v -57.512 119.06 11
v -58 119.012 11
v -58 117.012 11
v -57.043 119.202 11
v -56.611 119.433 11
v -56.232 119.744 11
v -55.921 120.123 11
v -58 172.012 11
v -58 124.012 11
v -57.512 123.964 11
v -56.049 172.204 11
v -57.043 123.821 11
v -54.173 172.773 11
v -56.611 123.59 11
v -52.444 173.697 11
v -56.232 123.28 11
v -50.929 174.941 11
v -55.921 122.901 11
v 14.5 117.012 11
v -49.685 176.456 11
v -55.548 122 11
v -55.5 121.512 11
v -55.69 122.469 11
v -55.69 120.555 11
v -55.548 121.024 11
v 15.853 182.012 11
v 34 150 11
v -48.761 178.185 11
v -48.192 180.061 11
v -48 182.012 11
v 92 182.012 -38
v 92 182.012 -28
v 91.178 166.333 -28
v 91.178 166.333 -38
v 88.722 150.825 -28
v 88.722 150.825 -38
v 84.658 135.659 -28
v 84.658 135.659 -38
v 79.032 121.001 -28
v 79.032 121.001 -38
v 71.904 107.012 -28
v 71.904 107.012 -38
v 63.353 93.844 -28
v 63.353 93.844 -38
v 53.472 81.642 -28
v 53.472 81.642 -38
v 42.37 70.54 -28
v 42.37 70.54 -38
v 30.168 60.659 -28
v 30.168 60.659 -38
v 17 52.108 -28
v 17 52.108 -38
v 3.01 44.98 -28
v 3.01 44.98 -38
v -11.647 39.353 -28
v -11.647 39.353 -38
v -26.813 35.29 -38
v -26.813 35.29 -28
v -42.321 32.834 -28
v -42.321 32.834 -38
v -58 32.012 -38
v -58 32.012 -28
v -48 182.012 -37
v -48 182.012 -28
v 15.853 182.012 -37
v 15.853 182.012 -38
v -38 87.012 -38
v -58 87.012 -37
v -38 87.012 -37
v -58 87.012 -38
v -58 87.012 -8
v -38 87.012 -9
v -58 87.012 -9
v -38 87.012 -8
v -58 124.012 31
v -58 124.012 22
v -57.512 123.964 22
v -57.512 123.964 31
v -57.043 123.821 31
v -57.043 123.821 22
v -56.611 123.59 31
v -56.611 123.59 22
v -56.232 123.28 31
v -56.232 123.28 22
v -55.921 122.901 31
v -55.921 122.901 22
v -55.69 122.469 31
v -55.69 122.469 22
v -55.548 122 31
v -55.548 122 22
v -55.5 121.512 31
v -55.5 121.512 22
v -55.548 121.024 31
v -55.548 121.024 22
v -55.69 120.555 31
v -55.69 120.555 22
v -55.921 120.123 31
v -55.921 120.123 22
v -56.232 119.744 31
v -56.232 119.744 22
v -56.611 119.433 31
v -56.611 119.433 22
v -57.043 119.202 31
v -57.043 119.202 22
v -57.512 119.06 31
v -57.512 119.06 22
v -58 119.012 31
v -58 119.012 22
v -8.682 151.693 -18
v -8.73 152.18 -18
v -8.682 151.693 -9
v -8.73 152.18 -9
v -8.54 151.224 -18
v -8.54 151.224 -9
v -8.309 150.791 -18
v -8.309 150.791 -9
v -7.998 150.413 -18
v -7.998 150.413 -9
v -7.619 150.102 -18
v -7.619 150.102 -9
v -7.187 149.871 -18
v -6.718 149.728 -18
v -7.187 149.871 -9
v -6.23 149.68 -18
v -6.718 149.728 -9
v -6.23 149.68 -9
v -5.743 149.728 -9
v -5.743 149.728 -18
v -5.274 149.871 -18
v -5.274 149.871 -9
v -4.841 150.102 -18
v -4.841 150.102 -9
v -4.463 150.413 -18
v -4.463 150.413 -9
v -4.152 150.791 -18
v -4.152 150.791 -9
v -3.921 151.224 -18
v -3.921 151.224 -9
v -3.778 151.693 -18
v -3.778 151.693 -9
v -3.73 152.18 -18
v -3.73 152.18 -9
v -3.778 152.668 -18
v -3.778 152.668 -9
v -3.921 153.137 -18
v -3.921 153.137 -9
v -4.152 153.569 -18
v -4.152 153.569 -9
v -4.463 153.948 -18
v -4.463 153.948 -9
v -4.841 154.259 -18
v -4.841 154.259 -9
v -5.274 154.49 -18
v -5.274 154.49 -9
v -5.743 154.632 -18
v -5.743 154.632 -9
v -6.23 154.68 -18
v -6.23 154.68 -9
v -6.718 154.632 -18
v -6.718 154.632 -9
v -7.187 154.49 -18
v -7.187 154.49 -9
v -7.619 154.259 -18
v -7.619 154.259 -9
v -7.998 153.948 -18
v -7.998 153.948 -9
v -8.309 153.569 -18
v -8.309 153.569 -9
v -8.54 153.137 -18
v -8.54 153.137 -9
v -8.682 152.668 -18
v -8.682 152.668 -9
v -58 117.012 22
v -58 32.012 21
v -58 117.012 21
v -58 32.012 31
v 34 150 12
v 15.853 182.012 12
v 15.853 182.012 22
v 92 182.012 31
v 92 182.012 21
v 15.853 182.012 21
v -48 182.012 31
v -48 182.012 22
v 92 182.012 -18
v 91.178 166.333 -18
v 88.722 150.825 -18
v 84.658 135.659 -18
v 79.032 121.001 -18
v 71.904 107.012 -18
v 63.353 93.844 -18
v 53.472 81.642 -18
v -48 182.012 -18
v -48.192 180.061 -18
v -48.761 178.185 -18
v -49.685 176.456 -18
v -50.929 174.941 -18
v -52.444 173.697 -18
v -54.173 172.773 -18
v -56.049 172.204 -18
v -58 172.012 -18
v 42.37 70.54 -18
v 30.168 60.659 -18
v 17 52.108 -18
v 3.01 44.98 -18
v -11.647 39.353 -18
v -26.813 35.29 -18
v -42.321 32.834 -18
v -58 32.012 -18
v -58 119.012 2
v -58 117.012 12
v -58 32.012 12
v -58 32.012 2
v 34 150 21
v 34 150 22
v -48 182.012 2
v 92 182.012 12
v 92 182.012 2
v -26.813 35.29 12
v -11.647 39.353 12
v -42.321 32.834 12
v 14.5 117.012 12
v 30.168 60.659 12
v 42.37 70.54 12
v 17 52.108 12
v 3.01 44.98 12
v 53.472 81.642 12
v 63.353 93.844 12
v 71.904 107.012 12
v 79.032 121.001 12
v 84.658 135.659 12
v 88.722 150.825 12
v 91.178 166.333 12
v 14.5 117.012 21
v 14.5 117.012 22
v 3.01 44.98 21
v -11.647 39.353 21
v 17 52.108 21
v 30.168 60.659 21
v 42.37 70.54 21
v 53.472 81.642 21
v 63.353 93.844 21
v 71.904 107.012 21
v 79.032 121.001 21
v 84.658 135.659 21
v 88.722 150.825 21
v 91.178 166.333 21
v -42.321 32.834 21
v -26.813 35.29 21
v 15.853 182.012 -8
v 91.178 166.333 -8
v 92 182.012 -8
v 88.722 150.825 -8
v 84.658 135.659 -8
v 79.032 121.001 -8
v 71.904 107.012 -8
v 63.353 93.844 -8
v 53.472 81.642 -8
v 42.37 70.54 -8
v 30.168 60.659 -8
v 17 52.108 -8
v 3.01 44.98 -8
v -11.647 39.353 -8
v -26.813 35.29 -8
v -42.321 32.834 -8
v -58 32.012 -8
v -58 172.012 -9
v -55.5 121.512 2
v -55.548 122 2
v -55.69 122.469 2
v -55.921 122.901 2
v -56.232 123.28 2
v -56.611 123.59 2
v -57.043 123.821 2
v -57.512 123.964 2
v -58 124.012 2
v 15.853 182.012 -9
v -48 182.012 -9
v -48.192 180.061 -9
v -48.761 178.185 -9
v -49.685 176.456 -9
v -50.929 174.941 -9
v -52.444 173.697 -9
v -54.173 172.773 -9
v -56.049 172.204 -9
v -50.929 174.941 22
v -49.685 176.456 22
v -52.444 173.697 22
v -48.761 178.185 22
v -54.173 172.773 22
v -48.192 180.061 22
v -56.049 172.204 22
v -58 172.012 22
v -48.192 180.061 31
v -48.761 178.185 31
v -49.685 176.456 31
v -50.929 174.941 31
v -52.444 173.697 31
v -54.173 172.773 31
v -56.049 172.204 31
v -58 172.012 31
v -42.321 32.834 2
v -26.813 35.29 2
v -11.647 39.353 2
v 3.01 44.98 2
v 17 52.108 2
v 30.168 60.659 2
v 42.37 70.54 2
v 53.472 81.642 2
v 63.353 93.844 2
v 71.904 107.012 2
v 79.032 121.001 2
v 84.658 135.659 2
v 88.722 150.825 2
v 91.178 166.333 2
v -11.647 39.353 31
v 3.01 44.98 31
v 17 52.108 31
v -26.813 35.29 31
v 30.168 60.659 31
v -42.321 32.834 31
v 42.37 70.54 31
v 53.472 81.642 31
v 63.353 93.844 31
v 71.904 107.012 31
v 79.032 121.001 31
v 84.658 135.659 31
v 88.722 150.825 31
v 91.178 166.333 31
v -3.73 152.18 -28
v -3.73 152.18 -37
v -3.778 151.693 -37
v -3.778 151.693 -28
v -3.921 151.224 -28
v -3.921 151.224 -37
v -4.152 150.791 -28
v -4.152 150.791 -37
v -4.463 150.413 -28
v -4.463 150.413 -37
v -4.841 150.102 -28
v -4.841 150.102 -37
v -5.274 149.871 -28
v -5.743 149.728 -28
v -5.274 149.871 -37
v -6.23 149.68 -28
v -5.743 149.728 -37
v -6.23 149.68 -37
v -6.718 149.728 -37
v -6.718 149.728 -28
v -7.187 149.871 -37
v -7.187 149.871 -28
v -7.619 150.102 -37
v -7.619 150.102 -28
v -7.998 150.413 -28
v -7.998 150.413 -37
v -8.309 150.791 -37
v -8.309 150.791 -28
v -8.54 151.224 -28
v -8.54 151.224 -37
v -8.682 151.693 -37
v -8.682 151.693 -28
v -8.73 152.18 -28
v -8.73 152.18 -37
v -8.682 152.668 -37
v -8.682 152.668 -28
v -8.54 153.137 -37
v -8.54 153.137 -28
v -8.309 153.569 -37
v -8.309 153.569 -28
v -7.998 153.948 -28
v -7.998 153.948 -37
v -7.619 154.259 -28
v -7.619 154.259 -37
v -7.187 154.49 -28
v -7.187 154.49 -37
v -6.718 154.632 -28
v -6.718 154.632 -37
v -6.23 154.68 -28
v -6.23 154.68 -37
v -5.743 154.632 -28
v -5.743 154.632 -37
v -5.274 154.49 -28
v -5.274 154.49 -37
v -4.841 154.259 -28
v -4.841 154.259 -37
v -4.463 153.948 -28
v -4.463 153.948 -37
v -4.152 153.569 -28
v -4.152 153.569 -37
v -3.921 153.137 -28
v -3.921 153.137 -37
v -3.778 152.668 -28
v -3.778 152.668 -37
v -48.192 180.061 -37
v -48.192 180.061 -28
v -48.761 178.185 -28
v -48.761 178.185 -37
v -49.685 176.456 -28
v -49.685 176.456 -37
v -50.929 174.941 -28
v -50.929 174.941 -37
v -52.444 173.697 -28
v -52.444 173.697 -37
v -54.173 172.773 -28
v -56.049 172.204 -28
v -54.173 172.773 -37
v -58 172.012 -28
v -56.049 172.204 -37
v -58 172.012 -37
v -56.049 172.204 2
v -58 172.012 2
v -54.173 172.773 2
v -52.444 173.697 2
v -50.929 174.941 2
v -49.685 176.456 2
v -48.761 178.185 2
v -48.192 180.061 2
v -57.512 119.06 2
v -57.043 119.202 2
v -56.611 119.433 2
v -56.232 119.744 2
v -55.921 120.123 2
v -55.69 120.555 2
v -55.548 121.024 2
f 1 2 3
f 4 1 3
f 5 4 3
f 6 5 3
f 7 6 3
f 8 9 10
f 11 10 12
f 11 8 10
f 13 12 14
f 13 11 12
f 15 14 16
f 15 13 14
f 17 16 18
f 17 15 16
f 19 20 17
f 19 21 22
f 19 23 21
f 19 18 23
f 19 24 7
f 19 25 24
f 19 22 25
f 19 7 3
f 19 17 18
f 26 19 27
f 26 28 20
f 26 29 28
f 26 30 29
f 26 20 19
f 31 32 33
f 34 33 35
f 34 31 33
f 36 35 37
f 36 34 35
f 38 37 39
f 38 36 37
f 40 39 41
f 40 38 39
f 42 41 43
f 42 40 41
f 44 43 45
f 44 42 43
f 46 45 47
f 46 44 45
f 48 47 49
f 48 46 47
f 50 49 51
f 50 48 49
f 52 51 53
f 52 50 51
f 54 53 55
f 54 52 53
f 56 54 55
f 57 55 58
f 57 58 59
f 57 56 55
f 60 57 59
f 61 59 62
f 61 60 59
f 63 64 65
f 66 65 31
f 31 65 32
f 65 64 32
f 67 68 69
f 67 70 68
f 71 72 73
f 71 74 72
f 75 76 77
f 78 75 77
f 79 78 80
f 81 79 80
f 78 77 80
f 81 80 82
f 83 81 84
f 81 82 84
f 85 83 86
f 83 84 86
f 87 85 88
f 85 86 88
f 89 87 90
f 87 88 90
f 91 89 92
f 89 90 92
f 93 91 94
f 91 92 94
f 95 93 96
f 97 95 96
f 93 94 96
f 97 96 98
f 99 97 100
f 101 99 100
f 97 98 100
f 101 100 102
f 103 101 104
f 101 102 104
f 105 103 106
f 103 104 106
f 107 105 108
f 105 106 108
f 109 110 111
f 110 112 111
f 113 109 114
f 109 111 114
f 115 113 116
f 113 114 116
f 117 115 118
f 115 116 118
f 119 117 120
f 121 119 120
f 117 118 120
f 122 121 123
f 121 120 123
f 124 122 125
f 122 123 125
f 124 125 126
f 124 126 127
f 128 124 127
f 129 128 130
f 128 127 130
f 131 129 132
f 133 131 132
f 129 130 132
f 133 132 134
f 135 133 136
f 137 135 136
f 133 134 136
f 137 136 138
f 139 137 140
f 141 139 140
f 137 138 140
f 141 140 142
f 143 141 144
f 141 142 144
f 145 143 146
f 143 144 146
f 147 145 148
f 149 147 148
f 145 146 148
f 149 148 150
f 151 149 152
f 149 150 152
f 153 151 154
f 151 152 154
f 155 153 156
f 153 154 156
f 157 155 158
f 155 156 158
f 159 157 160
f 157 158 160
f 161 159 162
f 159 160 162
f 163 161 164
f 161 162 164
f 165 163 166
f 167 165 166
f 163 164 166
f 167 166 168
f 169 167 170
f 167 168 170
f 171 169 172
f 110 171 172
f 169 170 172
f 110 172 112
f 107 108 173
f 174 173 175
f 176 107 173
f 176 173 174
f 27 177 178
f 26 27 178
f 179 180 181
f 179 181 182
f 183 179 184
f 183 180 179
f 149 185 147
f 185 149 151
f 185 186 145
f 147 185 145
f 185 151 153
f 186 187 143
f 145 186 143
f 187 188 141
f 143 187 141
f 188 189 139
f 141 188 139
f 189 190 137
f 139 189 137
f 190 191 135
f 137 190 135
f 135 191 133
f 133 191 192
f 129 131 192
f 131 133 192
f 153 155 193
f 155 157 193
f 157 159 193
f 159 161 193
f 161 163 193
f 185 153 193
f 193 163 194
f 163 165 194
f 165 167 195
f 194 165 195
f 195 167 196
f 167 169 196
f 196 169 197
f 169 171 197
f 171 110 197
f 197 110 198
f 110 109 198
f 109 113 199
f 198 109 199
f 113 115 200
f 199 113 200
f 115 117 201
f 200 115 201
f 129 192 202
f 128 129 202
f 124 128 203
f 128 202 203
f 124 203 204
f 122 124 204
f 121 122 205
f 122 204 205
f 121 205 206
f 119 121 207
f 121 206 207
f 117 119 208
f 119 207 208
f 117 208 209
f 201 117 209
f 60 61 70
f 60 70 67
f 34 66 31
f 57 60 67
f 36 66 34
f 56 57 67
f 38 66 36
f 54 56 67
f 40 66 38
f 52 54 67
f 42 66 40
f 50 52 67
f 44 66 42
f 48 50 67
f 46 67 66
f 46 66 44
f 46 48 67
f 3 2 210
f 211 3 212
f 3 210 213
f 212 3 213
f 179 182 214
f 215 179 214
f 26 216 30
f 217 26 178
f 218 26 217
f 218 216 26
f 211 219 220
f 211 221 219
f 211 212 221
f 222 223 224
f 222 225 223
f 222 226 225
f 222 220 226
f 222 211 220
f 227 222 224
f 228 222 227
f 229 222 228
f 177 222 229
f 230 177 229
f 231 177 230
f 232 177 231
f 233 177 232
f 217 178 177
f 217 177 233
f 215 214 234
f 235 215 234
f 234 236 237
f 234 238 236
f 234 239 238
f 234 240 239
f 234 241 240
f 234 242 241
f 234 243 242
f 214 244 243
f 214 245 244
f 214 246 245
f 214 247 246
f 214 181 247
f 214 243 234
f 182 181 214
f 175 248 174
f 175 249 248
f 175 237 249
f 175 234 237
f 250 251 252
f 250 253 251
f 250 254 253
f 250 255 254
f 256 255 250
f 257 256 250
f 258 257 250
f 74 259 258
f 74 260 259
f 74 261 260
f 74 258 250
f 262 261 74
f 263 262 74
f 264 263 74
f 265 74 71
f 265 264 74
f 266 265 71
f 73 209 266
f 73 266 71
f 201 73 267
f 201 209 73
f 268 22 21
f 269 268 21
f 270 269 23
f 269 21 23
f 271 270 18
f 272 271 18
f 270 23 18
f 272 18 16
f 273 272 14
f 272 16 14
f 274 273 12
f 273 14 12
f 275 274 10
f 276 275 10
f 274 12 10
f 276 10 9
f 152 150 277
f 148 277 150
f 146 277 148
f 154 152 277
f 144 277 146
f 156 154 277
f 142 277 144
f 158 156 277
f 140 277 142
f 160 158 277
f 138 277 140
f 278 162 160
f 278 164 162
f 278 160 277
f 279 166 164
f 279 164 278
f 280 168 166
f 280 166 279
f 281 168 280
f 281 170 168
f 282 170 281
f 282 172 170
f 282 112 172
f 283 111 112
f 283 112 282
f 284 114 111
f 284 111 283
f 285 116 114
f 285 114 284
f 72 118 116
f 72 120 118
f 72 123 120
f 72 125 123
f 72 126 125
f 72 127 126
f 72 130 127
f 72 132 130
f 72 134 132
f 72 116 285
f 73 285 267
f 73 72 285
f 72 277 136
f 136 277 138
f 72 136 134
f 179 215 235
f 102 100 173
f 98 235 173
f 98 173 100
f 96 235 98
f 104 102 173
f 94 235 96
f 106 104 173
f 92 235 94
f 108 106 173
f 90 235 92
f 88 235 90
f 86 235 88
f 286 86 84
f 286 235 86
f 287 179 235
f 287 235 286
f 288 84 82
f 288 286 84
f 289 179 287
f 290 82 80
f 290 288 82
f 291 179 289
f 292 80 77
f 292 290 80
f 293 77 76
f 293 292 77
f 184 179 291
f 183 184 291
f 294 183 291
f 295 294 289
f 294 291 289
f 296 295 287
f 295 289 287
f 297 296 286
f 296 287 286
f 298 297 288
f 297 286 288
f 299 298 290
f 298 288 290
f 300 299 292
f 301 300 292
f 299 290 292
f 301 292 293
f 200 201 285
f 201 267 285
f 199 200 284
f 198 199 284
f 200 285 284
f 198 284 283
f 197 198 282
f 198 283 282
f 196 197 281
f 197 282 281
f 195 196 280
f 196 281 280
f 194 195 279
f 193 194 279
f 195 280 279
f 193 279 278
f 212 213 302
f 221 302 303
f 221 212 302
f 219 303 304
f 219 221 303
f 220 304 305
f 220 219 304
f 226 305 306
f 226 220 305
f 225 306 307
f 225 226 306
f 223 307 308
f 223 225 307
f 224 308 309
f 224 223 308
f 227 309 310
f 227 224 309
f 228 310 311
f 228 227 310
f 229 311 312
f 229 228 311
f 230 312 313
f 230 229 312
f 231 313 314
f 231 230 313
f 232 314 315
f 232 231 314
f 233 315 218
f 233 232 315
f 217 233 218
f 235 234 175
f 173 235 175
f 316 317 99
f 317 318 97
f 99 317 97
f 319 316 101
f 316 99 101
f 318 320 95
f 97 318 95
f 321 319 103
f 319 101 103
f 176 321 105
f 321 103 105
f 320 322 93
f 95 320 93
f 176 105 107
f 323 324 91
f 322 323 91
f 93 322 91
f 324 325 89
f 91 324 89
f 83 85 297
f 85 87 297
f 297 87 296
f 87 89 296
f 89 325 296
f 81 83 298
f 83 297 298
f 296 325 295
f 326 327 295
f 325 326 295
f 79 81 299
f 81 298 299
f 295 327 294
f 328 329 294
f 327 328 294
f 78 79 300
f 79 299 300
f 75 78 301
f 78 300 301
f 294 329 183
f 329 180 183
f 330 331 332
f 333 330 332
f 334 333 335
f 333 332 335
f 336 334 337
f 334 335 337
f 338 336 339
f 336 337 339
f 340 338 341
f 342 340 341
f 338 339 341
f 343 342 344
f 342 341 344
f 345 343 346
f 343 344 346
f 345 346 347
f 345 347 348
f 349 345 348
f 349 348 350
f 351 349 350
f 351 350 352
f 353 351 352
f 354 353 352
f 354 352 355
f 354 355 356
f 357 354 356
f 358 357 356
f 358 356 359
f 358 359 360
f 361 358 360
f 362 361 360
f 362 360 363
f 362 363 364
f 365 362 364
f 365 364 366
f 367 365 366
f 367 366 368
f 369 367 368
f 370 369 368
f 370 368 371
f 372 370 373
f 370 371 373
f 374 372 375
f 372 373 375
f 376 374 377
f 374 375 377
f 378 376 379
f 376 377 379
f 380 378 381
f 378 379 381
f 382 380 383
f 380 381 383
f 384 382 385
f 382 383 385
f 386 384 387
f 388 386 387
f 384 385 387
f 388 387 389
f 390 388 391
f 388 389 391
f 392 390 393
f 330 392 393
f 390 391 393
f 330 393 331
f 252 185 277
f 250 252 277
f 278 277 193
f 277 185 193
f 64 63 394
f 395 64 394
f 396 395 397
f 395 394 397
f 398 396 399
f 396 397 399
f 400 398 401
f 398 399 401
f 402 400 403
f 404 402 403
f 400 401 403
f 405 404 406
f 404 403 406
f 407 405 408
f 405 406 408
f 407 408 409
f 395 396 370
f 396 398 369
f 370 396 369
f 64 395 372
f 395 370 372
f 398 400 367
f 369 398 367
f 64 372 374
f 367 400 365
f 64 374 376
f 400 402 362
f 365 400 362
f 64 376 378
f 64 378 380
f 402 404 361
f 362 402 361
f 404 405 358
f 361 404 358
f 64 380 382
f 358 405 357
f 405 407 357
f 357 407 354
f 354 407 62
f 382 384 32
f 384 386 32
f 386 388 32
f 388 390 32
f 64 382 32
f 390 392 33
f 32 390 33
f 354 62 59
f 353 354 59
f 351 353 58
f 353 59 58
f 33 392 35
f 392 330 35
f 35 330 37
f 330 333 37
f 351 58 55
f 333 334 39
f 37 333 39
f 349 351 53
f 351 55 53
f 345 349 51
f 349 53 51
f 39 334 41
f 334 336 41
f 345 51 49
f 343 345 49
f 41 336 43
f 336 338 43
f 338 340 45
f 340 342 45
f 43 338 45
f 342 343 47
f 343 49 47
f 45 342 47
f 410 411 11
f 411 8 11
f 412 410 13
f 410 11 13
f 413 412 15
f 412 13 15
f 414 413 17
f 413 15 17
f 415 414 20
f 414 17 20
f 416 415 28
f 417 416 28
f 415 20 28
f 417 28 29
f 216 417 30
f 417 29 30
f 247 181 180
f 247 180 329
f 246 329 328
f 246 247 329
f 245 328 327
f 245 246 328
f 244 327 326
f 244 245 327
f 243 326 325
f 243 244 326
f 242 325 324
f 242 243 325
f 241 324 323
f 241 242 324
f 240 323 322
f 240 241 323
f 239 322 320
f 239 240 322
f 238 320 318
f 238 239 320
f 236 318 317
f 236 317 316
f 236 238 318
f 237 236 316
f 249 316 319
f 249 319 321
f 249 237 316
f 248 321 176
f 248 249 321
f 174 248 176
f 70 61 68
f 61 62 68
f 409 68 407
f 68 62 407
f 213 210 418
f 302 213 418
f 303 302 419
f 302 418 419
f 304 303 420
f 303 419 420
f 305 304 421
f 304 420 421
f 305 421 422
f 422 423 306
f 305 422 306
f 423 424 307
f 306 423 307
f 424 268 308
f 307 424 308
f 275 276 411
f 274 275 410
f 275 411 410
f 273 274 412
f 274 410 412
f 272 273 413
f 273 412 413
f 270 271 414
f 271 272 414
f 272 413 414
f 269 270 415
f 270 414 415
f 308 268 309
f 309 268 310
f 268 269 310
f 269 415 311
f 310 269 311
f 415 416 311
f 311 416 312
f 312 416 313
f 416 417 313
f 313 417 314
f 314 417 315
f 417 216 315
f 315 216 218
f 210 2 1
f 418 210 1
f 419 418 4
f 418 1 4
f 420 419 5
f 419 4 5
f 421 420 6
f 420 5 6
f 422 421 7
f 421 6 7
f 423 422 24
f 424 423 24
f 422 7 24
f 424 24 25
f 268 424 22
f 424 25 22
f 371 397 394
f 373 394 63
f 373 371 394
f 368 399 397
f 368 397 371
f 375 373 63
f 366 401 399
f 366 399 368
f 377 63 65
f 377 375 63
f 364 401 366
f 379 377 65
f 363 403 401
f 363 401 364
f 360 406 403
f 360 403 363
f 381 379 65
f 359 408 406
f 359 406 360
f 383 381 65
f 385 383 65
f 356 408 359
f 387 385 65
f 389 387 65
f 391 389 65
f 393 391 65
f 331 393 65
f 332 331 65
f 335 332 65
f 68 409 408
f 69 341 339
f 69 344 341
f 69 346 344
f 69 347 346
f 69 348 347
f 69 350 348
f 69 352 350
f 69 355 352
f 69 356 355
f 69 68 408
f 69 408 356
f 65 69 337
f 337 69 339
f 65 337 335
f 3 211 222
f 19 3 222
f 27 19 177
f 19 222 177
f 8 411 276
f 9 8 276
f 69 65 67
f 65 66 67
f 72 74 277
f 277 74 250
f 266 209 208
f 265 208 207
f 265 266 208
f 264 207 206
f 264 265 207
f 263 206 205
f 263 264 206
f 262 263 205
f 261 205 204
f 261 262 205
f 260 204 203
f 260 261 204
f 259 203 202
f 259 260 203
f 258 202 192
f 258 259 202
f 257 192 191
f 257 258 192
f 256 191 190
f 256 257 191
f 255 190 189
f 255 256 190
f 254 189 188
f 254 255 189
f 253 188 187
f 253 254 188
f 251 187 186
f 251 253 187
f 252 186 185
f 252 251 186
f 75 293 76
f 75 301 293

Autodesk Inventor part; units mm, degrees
ref_plane "우측면도" through (0, 0, 0) normal (1, 0, 0) x (0, 1, 0)
ref_plane "평면도" through (0, 0, 0) normal (0, 1, 0) x (-1, 0, 0)
ref_plane "정면도" through (0, 0, 0) normal (0, 0, 1) x (1, 0, 0)
sketch "스케치1" plane through (0, 0, 0) normal (0, 0, 1) x (1, 0, 0)
  line L0 (0, 0) -> (19.5, -32.9882) construction
  circle A0 centre (92, 32.0118) radius 10
  circle A1 centre (143.7697, 61.8433) radius 2.5
  circle A2 centre (40.2303, 61.8433) radius 2.5
  circle A3 centre (92, -28.4882) radius 2.5
  circle A4 centre (92, 32.0118) radius 150
  line L1 (-58, 32.0118) -> (242, 32.0118)
  dimension "d5" = 20
  dimension "d7" = 5
  dimension "d10" = 5
  dimension "d14" = 5
  dimension "d16" = 300
  dimension "d18" = 59.7497
  dimension "d19" = 60.5
  dimension "d20" = 59.7497
  dimension "d21" = 97.4103
extrude "돌출1" add sketch "스케치1" against normal blind 10 contours L1 A4 A0 | A0 L1 A4
sketch "스케치2" plane through (0, 0, 0) normal (0, 0, 1) x (1, 0, 0)
  line L0 (72, 127.0118) -> (0, 0)
  line L1 (184, 0) -> (112, 127.0118)
  line L2 (19.5, -32.9882) -> (164.5, -32.9882)
  line L3 (72, 127.0118) -> (112, 127.0118)
  line L4 (0, 0) -> (19.5, -32.9882)
  line L5 (164.5, -32.9882) -> (184, 0)
  circle A0 centre (92, 32.0118) radius 10
  circle A1 centre (143.7697, 61.8433) radius 2
  circle A2 centre (40.2303, 61.8433) radius 2
  circle A3 centre (92, -28.4882) radius 2
  dimension "d24" = 184
  dimension "d25" = 146
  dimension "d26" = 146
  dimension "d27" = 145
  dimension "d28" = 40
  dimension "d29" = 20
  dimension "d30" = 65
  dimension "d31" = 4
  dimension "d32" = 4.5
  dimension "d33" = 72.5
  dimension "d34" = 4
  dimension "d35" = 4.5
  dimension "d36" = 72.5
  dimension "d37" = 4.5
  dimension "d38" = 4
  dimension "d39" = 72.5
extrude "돌출2" cut sketch "스케치2" against normal blind 1
sketch "스케치3" plane through (92, 32.0118, 0) normal (0, 0, 1) x (1, 0, 0)
  line L0 (0, 195.8297) -> (0, -216.3238)
  point P0 (-92, -32.0118)
surface extrude "돌출 곡면1" sketch "스케치3" along normal mid plane 739.5 shown no curves L0
sketch "스케치4" plane through (0, 0, 0) normal (0, 0, 1) x (1, 0, 0)
  line L0 (-58, 32.0118) -> (242, 32.0118)
  point P0 (0, 0)
sketch "스케치5" plane through (0, 0, -1) normal (0, 0, 1) x (1, 0, 0)
  point P0 (0, 0)
surface extrude "돌출 곡면2" sketch "스케치4" along normal mid plane 739.5 shown no curves L0
split body "분할1" result two bodies by surface "돌출 곡면2" first body at (45.9032, -16.1061, -9.5)
split body "분할2" result two bodies by surface "돌출 곡면1" bodies 3 first body at (108.6328, 95.8416, -9.5)
split body "분할3" result two bodies by surface "돌출 곡면1" bodies 2 first body at (138.1519, -16.0173, -9.5)
move or copy body "본체 이동1" bodies to move or copy 6 copy no translate (-150, 150, 12)
move or copy body "본체 이동2" bodies to move or copy 4 copy no translate (-150, 0, -12)
move or copy body "본체 이동3" bodies to move or copy 7 copy no translate (0, 150, 24)
move or copy body "본체 이동4" bodies to move or copy 7 copy no translate (0, 0, 3)
move or copy body "본체 이동5" bodies to move or copy 4 copy no translate (0, 0, 6)
move or copy body "본체 이동6" bodies to move or copy 4 copy no translate (0, 0, -12)
move or copy body "본체 이동7" bodies to move or copy 5 copy no translate (0, 0, -6)
move or copy body "본체 이동8" bodies to move or copy 5 copy no translate (0, 0, 3)
move or copy body "본체 이동9" bodies to move or copy 7 copy no rotation origin (0, 0, 0) rotation axis (0, 1, 0) rotation angle 180 translate (184, 0, 54)
move or copy body "본체 이동10" bodies to move or copy 4 copy no rotation origin (0, 0, 0) rotation axis (1, 0, 0) rotation angle -180 translate (0, 64.0236, -56)
move or copy body "본체 이동11" bodies to move or copy 5 copy no rotation origin (0, 0, 0) rotation axis (0, 1, 0) rotation angle -180 translate (184, 0, -26)
move or copy body "본체 이동12" bodies to move or copy 5 copy no rotation origin (0, 0, 0) rotation axis (1, 0, 0) rotation angle -180 translate (0, 64.0236, -46)
move or copy body "본체 이동13" bodies to move or copy 7 copy no translate (-150, 0, 0)
move or copy body "본체 이동14" bodies to move or copy 5 copy no translate (-150, 150, 0)
move or copy body "본체 이동15" bodies to move or copy 4 copy no translate (0, 150, 0)
move or copy body "본체 이동16" bodies to move or copy 5 copy no translate (0, 0, 12)
move or copy body "본체 이동17" bodies to move or copy 7 copy no translate (0, 0, -6)
move or copy body "본체 이동18" bodies to move or copy 5 copy no translate (0, 0, 3)
properties part number "밑판 메인"
